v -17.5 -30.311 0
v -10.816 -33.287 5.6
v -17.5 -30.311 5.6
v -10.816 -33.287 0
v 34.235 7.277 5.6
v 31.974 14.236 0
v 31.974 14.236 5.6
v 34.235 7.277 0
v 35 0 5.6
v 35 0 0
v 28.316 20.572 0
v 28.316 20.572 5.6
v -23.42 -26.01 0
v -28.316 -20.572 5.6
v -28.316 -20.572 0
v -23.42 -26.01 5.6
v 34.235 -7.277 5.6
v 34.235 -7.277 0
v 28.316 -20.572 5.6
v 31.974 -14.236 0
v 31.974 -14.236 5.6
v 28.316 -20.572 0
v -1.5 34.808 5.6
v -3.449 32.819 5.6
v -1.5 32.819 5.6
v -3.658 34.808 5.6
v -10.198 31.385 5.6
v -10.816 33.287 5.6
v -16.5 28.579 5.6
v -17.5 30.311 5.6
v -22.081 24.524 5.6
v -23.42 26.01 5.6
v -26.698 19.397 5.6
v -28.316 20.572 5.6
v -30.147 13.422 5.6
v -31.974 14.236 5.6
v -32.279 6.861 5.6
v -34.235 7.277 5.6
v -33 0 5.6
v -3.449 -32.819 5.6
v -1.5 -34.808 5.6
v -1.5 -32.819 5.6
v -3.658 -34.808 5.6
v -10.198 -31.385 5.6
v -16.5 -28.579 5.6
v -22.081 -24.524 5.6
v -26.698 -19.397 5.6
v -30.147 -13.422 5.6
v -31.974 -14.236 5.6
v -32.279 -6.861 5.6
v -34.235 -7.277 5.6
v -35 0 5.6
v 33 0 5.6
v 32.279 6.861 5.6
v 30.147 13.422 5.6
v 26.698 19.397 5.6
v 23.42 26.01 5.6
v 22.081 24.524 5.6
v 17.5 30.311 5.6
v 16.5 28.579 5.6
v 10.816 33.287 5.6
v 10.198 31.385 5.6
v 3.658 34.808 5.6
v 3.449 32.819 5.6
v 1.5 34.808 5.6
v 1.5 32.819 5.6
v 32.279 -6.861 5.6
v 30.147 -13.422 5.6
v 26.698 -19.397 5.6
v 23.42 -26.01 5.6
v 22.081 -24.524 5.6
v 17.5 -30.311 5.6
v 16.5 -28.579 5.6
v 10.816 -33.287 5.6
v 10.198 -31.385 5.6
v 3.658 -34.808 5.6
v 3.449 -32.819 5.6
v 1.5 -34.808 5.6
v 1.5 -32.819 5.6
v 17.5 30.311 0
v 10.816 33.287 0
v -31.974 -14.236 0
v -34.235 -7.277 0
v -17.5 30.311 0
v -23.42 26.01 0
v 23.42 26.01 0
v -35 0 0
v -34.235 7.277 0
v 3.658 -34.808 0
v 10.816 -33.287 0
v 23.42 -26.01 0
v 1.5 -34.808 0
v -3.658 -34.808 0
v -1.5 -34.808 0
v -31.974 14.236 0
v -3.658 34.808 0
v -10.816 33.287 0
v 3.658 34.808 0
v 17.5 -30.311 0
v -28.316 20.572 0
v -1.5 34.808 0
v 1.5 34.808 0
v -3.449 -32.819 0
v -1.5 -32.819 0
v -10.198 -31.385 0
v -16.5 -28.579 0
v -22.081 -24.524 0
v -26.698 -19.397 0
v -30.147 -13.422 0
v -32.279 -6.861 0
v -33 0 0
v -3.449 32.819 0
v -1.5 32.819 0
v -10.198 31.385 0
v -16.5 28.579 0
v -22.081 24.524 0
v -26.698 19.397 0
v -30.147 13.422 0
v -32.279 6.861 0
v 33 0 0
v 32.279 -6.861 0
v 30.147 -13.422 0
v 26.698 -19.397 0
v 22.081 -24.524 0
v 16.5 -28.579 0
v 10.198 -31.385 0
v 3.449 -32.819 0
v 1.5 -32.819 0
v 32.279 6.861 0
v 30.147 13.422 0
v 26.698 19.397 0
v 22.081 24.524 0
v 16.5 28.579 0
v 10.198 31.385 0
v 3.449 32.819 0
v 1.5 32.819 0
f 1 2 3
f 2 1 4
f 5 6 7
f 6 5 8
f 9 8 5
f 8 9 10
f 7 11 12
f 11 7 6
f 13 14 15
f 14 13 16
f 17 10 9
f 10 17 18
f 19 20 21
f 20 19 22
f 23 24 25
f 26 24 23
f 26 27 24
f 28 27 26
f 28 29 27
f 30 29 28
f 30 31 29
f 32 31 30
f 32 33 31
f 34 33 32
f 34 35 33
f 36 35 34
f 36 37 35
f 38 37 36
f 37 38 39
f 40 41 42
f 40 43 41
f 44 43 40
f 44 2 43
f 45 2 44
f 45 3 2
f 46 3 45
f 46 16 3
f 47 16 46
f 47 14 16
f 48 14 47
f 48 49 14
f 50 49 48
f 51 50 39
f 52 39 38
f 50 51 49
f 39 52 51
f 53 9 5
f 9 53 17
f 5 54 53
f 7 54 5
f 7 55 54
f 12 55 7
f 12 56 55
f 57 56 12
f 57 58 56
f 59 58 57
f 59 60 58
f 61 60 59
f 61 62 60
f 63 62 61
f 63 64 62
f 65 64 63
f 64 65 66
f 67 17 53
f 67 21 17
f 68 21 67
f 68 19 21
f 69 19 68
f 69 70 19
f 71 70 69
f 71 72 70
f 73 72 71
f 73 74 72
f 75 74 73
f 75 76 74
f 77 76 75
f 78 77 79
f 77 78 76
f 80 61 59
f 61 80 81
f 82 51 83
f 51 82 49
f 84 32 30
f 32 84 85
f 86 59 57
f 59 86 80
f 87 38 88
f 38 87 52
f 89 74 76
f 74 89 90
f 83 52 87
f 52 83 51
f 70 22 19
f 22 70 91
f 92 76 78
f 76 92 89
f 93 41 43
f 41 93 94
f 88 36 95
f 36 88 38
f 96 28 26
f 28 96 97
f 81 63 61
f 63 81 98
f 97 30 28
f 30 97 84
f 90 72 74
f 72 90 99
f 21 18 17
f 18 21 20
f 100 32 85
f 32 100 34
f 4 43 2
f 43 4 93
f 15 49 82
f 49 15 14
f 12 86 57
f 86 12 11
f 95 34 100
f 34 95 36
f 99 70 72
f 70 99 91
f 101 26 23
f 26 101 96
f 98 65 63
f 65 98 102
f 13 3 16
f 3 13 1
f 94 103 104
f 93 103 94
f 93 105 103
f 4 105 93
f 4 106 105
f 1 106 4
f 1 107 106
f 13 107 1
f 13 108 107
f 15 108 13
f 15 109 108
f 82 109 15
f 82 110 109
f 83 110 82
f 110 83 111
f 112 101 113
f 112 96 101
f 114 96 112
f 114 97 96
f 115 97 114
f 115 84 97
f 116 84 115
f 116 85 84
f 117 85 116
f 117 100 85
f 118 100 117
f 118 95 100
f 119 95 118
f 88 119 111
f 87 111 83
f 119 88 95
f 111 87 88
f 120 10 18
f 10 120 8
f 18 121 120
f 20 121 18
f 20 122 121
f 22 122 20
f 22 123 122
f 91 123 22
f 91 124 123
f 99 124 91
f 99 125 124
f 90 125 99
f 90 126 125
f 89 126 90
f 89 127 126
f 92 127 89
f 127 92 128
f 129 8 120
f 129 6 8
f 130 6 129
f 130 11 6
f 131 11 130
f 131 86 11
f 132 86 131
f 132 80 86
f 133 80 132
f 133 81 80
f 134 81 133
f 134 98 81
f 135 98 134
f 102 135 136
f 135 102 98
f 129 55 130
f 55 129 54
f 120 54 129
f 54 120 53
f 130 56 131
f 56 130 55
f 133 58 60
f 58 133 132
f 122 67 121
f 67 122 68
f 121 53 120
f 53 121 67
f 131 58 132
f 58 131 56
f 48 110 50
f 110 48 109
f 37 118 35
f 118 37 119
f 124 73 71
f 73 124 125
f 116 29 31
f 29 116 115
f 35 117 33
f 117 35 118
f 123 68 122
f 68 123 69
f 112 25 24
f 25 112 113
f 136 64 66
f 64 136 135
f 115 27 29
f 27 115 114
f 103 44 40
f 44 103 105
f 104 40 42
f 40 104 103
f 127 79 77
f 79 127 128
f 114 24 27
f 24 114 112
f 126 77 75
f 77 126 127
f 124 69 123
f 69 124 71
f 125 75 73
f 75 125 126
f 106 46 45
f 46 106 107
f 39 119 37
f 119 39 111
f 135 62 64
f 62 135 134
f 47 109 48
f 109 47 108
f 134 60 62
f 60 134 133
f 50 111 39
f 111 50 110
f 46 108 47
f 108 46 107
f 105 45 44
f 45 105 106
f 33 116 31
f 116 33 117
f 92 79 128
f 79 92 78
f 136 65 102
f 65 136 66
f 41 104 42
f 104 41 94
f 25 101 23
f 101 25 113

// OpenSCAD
// file: settingsLenghts.scad
//Ancho de la pared
pared  = 2;
//Radio del centro hueco
radioC = 11;
//Alto de la capa de apertura
aperH = 5.5;
//Ancho de la apertura
aperW = 5+1.1;//Ancho mas holgura
//Ancho del lente macro
macroW = 9.3;
//Profundidad del macro
macroH = 3;
//Profundidad parte de atras y delante
profDelante = 6;
profAtras = 6;
//Ceja entre uniones de cilindros
cejaH = 6;
guiaParedW = 2;
tmpHolg = 1.8;


//Correcc

//
//CÁMARA
camP = 3;//Grueso de la pared del presente modelo
camW = 105;//Ancho de la cámara
camH = 61;//Alto de la cámara
camD = 23.5;//Profundidad de la cámara
camHlg = 6;//Holgura que se deja para los tornillos
camLW = 57/2;//Radio del exterior del lente
torW  = 2;//Radio

//
//Ancho de tubo principal (grande)
mcW = 32;//radio
mcH = 28;

//Dimensiones del difractador
diffW = 51;//Alto y Ancho
diffD=1;//Profundidad del difractador
diffWinW=36;//Ancho de la ventana de difracción
diffWinH=24;//Alto de la ventana de difracción

//
//Adquisición de luz
luzHBig = 10; //donde va el tornillo
luzWBig = 28; //27:diametro donde va el tornillo
luzHBigT = 4; //alto del tornillo
luzWBigT = 6; //6: ancho del tornillo
luzHRosca = 7; //donde va la rosca
luzWRosca = 23; //22:diametro de donde va la rosca



//Cuadro guia para que no se mueva
guiaH = cejaH;
guiaW = 3;



module creaPared(h){
	difference(){
		//Pone el cilindro principal
		cylinder(r=mcW,h);

		//Le quita el contorno exterior
		translate([0,0,-0.1])
		cylinder(r=mcW-pared,h+0.2);
	}
}
module creaGuiaTornilloCentrada(){
	translate([-luzWBigT/2,-luzWBigT/2,0])
	cube([luzWBigT,luzWBigT,luzHBig-1+0.2]);
}
module creaGuiaTornilloCentradaArea(){
	tmpW = luzWBigT + pared;
	tmpH = luzHBig  + pared;
	translate([-tmpW/2,-tmpW/2,0])
	cube([tmpW,tmpW,tmpH]);
}
module creaGuia(h){
	//Pone el circulo soporte
	difference(){
		cylinder(r=mcW,h);
		translate([0,0,-0.1])
		cylinder(r=mcW-pared,h+0.2);
	}
	//Pone la guia1
	translate([0,mcW-pared-(guiaW/2)+0.4,0])
	creaGuiaCentrada(h);
}
module creaGuiaHembra(h){
	//Pone el circulo soporte
	tmpW = mcW-guiaW;	
	creaPared(sopH);
	sopH = 1.35;
	
	//Pone la pared de la guia
	difference(){
		cylinder(r=(mcW-pared),sopH+h);
		translate([0,0,-0.1])
		cylinder(r=(mcW-pared-guiaParedW),sopH+h+0.2);
		//Pone la guia
		translate([-(guiaW/3),tmpW,sopH])
		creaGuiaCentrada(sopH+h+0.2);
		translate([(guiaW/3),tmpW,sopH])
		creaGuiaCentrada(sopH+h+0.2);
	}
}
module creaGuiaCentrada(h){
	translate([-guiaW/2,-guiaW/2,0])
	cube([guiaW,guiaW,h]);
}
// main file
include <settingsLenghts.scad>


/////////////////////////////////////
tmpWExt = mcW+pared+1;
espW = 3;

difference(){
	//Pone el cilindro principal
	cylinder(r=tmpWExt,cejaH-0.4);

	//Quita centro
	translate([0,0,-0.1])
	cylinder(r=tmpWExt-pared,cejaH);

	
	translate([-espW/2,-tmpWExt,-0.1])
	cube([espW,tmpWExt*2+1,cejaH]);
}
